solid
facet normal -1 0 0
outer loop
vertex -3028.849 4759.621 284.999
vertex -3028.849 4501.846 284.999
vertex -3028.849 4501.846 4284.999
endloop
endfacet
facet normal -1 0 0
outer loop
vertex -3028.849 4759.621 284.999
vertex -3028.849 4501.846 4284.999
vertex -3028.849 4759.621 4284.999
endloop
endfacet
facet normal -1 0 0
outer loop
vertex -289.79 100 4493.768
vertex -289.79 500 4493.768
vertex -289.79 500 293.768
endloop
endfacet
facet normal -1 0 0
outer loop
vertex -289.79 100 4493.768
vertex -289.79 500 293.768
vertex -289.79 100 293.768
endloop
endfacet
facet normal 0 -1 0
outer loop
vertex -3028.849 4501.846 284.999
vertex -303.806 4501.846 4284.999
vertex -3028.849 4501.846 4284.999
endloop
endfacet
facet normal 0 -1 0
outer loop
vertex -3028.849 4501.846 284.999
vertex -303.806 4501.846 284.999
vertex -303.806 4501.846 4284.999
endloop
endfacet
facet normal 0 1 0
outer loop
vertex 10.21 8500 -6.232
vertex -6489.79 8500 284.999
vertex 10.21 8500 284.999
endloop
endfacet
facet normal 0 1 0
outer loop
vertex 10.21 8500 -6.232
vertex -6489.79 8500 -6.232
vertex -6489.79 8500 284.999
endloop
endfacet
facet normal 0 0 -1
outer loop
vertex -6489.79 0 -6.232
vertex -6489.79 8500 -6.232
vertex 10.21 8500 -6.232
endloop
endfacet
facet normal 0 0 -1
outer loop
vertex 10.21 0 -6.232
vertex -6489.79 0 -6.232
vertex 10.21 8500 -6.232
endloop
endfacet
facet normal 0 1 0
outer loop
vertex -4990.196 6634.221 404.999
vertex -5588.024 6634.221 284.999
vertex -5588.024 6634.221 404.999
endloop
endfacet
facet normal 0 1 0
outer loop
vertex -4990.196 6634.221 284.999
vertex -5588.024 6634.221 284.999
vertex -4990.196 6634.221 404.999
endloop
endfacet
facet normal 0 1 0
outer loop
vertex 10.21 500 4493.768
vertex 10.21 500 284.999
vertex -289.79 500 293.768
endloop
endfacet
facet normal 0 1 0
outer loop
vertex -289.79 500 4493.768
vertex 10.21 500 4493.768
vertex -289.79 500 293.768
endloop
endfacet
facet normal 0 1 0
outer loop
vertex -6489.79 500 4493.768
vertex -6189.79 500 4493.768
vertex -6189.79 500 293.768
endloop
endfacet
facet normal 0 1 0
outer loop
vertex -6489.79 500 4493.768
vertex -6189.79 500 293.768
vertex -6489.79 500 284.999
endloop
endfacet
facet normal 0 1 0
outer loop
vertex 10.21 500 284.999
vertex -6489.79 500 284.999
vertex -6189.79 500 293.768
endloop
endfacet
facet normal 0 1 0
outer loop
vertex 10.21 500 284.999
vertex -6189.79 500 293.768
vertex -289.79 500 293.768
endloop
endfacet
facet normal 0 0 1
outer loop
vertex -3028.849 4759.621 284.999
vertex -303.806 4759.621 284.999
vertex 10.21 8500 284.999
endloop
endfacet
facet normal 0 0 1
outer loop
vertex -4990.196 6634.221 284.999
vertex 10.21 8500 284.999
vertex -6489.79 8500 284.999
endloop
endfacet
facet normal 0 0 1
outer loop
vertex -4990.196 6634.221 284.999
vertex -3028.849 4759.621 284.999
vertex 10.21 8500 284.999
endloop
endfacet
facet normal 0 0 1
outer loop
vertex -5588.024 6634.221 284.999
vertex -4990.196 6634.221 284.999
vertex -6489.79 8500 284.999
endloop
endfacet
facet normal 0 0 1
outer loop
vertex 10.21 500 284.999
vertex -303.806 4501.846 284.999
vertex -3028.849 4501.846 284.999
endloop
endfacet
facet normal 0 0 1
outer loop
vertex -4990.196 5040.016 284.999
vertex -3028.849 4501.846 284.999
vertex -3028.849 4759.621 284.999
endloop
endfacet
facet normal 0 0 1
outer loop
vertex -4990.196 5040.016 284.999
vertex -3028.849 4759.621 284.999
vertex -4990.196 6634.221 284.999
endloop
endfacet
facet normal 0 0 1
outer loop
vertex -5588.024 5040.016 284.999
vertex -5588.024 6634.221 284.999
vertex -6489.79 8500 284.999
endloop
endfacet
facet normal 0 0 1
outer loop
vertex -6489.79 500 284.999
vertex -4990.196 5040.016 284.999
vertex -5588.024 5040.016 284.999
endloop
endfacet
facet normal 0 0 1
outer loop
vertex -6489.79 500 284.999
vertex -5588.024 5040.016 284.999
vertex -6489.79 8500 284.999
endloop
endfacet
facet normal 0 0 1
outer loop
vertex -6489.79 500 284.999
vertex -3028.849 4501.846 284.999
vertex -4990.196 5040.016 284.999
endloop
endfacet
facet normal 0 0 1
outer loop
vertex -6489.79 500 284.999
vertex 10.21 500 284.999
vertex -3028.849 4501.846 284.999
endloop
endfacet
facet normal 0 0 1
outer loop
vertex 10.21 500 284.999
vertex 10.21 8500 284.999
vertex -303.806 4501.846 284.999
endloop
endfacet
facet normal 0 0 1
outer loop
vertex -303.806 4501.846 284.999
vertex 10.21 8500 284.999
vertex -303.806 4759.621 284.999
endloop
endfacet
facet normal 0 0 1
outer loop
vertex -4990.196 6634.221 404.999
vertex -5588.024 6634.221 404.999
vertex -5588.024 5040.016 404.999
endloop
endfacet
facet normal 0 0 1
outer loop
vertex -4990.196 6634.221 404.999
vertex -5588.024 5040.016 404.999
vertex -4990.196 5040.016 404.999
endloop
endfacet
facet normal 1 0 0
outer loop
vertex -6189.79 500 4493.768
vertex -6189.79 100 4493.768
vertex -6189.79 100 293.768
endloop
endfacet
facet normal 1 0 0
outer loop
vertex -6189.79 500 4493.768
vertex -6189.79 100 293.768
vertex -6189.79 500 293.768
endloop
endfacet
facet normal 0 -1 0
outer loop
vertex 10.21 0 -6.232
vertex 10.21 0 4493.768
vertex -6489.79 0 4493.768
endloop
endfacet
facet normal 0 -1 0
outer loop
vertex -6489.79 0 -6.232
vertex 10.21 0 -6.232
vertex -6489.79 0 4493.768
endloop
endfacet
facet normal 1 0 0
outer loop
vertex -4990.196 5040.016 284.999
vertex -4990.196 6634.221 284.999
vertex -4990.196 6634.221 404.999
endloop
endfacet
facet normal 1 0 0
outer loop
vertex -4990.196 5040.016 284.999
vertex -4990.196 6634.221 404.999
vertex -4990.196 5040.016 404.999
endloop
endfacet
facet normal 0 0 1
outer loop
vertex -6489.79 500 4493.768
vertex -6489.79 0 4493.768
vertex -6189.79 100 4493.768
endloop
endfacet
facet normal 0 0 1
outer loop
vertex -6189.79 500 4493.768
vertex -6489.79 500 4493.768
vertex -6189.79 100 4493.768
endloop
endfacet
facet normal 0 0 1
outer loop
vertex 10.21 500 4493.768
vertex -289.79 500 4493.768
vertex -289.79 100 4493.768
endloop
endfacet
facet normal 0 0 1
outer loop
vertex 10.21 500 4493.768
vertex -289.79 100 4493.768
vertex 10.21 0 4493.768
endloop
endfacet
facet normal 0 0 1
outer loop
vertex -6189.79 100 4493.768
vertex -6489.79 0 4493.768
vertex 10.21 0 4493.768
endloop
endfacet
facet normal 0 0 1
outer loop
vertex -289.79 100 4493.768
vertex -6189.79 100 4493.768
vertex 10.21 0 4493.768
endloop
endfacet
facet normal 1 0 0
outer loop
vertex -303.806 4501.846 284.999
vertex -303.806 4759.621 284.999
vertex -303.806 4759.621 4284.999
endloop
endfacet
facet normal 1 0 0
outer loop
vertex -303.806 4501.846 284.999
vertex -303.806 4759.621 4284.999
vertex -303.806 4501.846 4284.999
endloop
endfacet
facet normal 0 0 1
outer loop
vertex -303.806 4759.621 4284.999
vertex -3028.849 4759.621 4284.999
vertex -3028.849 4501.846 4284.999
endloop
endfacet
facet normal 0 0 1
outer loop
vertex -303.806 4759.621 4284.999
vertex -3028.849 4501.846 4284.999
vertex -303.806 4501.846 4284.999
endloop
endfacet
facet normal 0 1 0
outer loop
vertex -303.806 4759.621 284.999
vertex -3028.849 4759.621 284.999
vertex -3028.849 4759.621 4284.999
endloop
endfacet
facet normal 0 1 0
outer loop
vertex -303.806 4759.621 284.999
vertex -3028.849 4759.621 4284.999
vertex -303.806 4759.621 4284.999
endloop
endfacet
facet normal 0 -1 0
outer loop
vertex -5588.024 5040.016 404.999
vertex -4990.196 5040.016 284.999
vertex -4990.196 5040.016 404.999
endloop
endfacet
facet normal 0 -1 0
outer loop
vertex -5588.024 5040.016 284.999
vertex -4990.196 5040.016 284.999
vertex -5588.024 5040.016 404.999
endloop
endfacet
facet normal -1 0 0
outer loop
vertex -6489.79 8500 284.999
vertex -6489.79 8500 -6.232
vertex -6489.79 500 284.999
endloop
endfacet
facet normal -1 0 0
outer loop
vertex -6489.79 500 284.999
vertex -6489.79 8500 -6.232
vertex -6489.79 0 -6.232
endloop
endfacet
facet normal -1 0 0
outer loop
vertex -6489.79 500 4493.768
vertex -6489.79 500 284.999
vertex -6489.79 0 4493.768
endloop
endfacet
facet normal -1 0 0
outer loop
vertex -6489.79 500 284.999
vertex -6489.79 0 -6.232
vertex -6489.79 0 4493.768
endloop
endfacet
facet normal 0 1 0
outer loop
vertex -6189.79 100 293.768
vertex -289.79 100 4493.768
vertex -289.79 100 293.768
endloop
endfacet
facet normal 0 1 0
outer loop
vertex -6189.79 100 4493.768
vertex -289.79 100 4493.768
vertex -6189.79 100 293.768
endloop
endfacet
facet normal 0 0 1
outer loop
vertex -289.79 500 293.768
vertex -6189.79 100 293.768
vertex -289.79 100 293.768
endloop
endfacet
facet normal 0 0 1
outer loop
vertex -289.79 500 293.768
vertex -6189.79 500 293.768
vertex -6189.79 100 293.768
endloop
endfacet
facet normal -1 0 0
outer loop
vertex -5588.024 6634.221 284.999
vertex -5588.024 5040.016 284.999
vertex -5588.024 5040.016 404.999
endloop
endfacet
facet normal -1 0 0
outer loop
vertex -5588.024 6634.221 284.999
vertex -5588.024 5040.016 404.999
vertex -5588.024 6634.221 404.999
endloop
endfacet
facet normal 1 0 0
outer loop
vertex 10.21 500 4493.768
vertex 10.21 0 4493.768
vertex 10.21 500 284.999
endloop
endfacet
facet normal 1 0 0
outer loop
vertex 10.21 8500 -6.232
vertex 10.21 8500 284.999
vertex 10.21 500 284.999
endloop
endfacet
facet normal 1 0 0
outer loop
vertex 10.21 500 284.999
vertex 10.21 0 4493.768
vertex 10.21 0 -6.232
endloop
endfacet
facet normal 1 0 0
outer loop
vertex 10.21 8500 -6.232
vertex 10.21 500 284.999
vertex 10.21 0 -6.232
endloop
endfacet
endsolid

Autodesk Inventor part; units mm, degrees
ref_plane "YZ Plane" through (0, 0, 0) normal (1, 0, 0) x (0, 1, 0)
ref_plane "XZ Plane" through (0, 0, 0) normal (0, 1, 0) x (-1, 0, 0)
ref_plane "XY Plane" through (0, 0, 0) normal (0, 0, 1) x (1, 0, 0)
sketch "Sketch1" plane through (0, 0, 0) normal (0, 1, 0) x (-1, 0, 0)
  line L0 (6489.7905, 4493.7678) -> (-10.2095, 4493.7678)
  line L1 (-10.2095, 4493.7678) -> (-10.2095, -6.2322)
  line L2 (-10.2095, -6.2322) -> (6489.7905, -6.2322)
  line L3 (6489.7905, -6.2322) -> (6489.7905, 4493.7678)
  point P0 (0, 0)
  dimension "d0" = 6500
  dimension "d1" = 4500
extrude "Extrusion1" add sketch "Sketch1" along normal blind 500
sketch "Sketch6" plane through (0, 500, 0) normal (0, 1, 0) x (1, 0, 0)
  line L0 (-6189.7905, -293.7678) -> (-289.7905, -293.7678)
  line L1 (-289.7905, -293.7678) -> (-289.7905, -4193.7678)
  line L2 (-289.7905, -4193.7678) -> (-6189.7905, -4193.7678)
  line L3 (-6189.7905, -4193.7678) -> (-6189.7905, -293.7678)
  line L4 (10.2095, 6.2322) -> (-6489.7905, 6.2322) projected
  line L5 (-6489.7905, -4493.7678) -> (10.2095, -4493.7678) projected
  line L6 (-6489.7905, 6.2322) -> (-6489.7905, -4493.7678) projected
  line L7 (10.2095, -4493.7678) -> (10.2095, 6.2322) projected
  point P0 (0, 0)
  dimension "d22" = 300
  dimension "d23" = 300
  dimension "d24" = 300
  dimension "d25" = 300
extrude "Extrusion5" cut sketch "Sketch6" against normal blind 400 contours L0 L1 L2 L3
sketch "Sketch7" plane through (0, 500, 0) normal (0, 1, 0) x (1, 0, 0)
  line L0 (-6489.7905, 6.2322) -> (-6489.7905, -4493.7678) projected
  line L1 (10.2095, -4493.7678) -> (10.2095, 6.2322) projected
  line L2 (-6489.7905, 6.2322) -> (10.2095, 6.2322)
  line L3 (10.2095, 6.2322) -> (10.2095, -284.9992)
  line L4 (10.2095, -284.9992) -> (-6489.7905, -284.9992)
  line L5 (-6489.7905, -284.9992) -> (-6489.7905, 6.2322)
  point P0 (0, 0)
extrude "Extrusion6" add sketch "Sketch7" along normal blind 8000
sketch "Sketch8" plane through (-6489.7905, 0, 4493.7678) normal (0, 0, 1) x (1, 0, 0)
  line L0 (6200, 500) -> (300, 500) projected
  line L1 (300, 500) -> (6200, 500)
  line L2 (6200, 500) -> (6200, 100)
  line L3 (6200, 100) -> (300, 100)
  line L4 (300, 100) -> (300, 500)
  line L5 (6500, 0) -> (6500, 500) projected
  line L6 (0, 0) -> (6500, 0) projected
  point P0 (6489.7905, 0)
  dimension "d30" = 300
  dimension "d31" = 100
extrude "Extrusion7" cut sketch "Sketch8" against normal blind 300
sketch "Sketch9" plane through (-6489.7905, 500, 284.9992) normal (0, 0, 1) x (1, 0, 0)
  line L0 (3460.9411, 4259.6208) -> (6185.9849, 4259.6208)
  line L1 (6185.9849, 4259.6208) -> (6185.9849, 4001.8464)
  line L2 (6185.9849, 4001.8464) -> (3460.9411, 4001.8464)
  line L3 (3460.9411, 4001.8464) -> (3460.9411, 4259.6208)
  line L4 (165.1111, 1221.565) -> (2853.33, 1221.565)
  line L5 (2853.33, 1221.565) -> (2853.33, 908.5532)
  line L6 (2853.33, 908.5532) -> (165.1111, 908.5532)
  line L7 (165.1111, 908.5532) -> (165.1111, 1221.565)
  point P0 (6489.7905, -500)
extrude "Extrusion8" add sketch "Sketch9" along normal blind 4000 contours L0 L1 L2 L3
sketch "Sketch11" plane through (-6489.7905, 500, 284.9992) normal (0, 0, 1) x (1, 0, 0)
  line L0 (901.7669, 6134.2214) -> (1499.5941, 6134.2214)
  line L1 (1499.5941, 6134.2214) -> (1499.5941, 4540.0155)
  line L2 (1499.5941, 4540.0155) -> (901.7669, 4540.0155)
  line L3 (901.7669, 4540.0155) -> (901.7669, 6134.2214)
  point P0 (6489.7905, -500)
extrude "Extrusion10" add sketch "Sketch11" along normal blind 120
properties part number "Base model" material "Wood (Maple)"
